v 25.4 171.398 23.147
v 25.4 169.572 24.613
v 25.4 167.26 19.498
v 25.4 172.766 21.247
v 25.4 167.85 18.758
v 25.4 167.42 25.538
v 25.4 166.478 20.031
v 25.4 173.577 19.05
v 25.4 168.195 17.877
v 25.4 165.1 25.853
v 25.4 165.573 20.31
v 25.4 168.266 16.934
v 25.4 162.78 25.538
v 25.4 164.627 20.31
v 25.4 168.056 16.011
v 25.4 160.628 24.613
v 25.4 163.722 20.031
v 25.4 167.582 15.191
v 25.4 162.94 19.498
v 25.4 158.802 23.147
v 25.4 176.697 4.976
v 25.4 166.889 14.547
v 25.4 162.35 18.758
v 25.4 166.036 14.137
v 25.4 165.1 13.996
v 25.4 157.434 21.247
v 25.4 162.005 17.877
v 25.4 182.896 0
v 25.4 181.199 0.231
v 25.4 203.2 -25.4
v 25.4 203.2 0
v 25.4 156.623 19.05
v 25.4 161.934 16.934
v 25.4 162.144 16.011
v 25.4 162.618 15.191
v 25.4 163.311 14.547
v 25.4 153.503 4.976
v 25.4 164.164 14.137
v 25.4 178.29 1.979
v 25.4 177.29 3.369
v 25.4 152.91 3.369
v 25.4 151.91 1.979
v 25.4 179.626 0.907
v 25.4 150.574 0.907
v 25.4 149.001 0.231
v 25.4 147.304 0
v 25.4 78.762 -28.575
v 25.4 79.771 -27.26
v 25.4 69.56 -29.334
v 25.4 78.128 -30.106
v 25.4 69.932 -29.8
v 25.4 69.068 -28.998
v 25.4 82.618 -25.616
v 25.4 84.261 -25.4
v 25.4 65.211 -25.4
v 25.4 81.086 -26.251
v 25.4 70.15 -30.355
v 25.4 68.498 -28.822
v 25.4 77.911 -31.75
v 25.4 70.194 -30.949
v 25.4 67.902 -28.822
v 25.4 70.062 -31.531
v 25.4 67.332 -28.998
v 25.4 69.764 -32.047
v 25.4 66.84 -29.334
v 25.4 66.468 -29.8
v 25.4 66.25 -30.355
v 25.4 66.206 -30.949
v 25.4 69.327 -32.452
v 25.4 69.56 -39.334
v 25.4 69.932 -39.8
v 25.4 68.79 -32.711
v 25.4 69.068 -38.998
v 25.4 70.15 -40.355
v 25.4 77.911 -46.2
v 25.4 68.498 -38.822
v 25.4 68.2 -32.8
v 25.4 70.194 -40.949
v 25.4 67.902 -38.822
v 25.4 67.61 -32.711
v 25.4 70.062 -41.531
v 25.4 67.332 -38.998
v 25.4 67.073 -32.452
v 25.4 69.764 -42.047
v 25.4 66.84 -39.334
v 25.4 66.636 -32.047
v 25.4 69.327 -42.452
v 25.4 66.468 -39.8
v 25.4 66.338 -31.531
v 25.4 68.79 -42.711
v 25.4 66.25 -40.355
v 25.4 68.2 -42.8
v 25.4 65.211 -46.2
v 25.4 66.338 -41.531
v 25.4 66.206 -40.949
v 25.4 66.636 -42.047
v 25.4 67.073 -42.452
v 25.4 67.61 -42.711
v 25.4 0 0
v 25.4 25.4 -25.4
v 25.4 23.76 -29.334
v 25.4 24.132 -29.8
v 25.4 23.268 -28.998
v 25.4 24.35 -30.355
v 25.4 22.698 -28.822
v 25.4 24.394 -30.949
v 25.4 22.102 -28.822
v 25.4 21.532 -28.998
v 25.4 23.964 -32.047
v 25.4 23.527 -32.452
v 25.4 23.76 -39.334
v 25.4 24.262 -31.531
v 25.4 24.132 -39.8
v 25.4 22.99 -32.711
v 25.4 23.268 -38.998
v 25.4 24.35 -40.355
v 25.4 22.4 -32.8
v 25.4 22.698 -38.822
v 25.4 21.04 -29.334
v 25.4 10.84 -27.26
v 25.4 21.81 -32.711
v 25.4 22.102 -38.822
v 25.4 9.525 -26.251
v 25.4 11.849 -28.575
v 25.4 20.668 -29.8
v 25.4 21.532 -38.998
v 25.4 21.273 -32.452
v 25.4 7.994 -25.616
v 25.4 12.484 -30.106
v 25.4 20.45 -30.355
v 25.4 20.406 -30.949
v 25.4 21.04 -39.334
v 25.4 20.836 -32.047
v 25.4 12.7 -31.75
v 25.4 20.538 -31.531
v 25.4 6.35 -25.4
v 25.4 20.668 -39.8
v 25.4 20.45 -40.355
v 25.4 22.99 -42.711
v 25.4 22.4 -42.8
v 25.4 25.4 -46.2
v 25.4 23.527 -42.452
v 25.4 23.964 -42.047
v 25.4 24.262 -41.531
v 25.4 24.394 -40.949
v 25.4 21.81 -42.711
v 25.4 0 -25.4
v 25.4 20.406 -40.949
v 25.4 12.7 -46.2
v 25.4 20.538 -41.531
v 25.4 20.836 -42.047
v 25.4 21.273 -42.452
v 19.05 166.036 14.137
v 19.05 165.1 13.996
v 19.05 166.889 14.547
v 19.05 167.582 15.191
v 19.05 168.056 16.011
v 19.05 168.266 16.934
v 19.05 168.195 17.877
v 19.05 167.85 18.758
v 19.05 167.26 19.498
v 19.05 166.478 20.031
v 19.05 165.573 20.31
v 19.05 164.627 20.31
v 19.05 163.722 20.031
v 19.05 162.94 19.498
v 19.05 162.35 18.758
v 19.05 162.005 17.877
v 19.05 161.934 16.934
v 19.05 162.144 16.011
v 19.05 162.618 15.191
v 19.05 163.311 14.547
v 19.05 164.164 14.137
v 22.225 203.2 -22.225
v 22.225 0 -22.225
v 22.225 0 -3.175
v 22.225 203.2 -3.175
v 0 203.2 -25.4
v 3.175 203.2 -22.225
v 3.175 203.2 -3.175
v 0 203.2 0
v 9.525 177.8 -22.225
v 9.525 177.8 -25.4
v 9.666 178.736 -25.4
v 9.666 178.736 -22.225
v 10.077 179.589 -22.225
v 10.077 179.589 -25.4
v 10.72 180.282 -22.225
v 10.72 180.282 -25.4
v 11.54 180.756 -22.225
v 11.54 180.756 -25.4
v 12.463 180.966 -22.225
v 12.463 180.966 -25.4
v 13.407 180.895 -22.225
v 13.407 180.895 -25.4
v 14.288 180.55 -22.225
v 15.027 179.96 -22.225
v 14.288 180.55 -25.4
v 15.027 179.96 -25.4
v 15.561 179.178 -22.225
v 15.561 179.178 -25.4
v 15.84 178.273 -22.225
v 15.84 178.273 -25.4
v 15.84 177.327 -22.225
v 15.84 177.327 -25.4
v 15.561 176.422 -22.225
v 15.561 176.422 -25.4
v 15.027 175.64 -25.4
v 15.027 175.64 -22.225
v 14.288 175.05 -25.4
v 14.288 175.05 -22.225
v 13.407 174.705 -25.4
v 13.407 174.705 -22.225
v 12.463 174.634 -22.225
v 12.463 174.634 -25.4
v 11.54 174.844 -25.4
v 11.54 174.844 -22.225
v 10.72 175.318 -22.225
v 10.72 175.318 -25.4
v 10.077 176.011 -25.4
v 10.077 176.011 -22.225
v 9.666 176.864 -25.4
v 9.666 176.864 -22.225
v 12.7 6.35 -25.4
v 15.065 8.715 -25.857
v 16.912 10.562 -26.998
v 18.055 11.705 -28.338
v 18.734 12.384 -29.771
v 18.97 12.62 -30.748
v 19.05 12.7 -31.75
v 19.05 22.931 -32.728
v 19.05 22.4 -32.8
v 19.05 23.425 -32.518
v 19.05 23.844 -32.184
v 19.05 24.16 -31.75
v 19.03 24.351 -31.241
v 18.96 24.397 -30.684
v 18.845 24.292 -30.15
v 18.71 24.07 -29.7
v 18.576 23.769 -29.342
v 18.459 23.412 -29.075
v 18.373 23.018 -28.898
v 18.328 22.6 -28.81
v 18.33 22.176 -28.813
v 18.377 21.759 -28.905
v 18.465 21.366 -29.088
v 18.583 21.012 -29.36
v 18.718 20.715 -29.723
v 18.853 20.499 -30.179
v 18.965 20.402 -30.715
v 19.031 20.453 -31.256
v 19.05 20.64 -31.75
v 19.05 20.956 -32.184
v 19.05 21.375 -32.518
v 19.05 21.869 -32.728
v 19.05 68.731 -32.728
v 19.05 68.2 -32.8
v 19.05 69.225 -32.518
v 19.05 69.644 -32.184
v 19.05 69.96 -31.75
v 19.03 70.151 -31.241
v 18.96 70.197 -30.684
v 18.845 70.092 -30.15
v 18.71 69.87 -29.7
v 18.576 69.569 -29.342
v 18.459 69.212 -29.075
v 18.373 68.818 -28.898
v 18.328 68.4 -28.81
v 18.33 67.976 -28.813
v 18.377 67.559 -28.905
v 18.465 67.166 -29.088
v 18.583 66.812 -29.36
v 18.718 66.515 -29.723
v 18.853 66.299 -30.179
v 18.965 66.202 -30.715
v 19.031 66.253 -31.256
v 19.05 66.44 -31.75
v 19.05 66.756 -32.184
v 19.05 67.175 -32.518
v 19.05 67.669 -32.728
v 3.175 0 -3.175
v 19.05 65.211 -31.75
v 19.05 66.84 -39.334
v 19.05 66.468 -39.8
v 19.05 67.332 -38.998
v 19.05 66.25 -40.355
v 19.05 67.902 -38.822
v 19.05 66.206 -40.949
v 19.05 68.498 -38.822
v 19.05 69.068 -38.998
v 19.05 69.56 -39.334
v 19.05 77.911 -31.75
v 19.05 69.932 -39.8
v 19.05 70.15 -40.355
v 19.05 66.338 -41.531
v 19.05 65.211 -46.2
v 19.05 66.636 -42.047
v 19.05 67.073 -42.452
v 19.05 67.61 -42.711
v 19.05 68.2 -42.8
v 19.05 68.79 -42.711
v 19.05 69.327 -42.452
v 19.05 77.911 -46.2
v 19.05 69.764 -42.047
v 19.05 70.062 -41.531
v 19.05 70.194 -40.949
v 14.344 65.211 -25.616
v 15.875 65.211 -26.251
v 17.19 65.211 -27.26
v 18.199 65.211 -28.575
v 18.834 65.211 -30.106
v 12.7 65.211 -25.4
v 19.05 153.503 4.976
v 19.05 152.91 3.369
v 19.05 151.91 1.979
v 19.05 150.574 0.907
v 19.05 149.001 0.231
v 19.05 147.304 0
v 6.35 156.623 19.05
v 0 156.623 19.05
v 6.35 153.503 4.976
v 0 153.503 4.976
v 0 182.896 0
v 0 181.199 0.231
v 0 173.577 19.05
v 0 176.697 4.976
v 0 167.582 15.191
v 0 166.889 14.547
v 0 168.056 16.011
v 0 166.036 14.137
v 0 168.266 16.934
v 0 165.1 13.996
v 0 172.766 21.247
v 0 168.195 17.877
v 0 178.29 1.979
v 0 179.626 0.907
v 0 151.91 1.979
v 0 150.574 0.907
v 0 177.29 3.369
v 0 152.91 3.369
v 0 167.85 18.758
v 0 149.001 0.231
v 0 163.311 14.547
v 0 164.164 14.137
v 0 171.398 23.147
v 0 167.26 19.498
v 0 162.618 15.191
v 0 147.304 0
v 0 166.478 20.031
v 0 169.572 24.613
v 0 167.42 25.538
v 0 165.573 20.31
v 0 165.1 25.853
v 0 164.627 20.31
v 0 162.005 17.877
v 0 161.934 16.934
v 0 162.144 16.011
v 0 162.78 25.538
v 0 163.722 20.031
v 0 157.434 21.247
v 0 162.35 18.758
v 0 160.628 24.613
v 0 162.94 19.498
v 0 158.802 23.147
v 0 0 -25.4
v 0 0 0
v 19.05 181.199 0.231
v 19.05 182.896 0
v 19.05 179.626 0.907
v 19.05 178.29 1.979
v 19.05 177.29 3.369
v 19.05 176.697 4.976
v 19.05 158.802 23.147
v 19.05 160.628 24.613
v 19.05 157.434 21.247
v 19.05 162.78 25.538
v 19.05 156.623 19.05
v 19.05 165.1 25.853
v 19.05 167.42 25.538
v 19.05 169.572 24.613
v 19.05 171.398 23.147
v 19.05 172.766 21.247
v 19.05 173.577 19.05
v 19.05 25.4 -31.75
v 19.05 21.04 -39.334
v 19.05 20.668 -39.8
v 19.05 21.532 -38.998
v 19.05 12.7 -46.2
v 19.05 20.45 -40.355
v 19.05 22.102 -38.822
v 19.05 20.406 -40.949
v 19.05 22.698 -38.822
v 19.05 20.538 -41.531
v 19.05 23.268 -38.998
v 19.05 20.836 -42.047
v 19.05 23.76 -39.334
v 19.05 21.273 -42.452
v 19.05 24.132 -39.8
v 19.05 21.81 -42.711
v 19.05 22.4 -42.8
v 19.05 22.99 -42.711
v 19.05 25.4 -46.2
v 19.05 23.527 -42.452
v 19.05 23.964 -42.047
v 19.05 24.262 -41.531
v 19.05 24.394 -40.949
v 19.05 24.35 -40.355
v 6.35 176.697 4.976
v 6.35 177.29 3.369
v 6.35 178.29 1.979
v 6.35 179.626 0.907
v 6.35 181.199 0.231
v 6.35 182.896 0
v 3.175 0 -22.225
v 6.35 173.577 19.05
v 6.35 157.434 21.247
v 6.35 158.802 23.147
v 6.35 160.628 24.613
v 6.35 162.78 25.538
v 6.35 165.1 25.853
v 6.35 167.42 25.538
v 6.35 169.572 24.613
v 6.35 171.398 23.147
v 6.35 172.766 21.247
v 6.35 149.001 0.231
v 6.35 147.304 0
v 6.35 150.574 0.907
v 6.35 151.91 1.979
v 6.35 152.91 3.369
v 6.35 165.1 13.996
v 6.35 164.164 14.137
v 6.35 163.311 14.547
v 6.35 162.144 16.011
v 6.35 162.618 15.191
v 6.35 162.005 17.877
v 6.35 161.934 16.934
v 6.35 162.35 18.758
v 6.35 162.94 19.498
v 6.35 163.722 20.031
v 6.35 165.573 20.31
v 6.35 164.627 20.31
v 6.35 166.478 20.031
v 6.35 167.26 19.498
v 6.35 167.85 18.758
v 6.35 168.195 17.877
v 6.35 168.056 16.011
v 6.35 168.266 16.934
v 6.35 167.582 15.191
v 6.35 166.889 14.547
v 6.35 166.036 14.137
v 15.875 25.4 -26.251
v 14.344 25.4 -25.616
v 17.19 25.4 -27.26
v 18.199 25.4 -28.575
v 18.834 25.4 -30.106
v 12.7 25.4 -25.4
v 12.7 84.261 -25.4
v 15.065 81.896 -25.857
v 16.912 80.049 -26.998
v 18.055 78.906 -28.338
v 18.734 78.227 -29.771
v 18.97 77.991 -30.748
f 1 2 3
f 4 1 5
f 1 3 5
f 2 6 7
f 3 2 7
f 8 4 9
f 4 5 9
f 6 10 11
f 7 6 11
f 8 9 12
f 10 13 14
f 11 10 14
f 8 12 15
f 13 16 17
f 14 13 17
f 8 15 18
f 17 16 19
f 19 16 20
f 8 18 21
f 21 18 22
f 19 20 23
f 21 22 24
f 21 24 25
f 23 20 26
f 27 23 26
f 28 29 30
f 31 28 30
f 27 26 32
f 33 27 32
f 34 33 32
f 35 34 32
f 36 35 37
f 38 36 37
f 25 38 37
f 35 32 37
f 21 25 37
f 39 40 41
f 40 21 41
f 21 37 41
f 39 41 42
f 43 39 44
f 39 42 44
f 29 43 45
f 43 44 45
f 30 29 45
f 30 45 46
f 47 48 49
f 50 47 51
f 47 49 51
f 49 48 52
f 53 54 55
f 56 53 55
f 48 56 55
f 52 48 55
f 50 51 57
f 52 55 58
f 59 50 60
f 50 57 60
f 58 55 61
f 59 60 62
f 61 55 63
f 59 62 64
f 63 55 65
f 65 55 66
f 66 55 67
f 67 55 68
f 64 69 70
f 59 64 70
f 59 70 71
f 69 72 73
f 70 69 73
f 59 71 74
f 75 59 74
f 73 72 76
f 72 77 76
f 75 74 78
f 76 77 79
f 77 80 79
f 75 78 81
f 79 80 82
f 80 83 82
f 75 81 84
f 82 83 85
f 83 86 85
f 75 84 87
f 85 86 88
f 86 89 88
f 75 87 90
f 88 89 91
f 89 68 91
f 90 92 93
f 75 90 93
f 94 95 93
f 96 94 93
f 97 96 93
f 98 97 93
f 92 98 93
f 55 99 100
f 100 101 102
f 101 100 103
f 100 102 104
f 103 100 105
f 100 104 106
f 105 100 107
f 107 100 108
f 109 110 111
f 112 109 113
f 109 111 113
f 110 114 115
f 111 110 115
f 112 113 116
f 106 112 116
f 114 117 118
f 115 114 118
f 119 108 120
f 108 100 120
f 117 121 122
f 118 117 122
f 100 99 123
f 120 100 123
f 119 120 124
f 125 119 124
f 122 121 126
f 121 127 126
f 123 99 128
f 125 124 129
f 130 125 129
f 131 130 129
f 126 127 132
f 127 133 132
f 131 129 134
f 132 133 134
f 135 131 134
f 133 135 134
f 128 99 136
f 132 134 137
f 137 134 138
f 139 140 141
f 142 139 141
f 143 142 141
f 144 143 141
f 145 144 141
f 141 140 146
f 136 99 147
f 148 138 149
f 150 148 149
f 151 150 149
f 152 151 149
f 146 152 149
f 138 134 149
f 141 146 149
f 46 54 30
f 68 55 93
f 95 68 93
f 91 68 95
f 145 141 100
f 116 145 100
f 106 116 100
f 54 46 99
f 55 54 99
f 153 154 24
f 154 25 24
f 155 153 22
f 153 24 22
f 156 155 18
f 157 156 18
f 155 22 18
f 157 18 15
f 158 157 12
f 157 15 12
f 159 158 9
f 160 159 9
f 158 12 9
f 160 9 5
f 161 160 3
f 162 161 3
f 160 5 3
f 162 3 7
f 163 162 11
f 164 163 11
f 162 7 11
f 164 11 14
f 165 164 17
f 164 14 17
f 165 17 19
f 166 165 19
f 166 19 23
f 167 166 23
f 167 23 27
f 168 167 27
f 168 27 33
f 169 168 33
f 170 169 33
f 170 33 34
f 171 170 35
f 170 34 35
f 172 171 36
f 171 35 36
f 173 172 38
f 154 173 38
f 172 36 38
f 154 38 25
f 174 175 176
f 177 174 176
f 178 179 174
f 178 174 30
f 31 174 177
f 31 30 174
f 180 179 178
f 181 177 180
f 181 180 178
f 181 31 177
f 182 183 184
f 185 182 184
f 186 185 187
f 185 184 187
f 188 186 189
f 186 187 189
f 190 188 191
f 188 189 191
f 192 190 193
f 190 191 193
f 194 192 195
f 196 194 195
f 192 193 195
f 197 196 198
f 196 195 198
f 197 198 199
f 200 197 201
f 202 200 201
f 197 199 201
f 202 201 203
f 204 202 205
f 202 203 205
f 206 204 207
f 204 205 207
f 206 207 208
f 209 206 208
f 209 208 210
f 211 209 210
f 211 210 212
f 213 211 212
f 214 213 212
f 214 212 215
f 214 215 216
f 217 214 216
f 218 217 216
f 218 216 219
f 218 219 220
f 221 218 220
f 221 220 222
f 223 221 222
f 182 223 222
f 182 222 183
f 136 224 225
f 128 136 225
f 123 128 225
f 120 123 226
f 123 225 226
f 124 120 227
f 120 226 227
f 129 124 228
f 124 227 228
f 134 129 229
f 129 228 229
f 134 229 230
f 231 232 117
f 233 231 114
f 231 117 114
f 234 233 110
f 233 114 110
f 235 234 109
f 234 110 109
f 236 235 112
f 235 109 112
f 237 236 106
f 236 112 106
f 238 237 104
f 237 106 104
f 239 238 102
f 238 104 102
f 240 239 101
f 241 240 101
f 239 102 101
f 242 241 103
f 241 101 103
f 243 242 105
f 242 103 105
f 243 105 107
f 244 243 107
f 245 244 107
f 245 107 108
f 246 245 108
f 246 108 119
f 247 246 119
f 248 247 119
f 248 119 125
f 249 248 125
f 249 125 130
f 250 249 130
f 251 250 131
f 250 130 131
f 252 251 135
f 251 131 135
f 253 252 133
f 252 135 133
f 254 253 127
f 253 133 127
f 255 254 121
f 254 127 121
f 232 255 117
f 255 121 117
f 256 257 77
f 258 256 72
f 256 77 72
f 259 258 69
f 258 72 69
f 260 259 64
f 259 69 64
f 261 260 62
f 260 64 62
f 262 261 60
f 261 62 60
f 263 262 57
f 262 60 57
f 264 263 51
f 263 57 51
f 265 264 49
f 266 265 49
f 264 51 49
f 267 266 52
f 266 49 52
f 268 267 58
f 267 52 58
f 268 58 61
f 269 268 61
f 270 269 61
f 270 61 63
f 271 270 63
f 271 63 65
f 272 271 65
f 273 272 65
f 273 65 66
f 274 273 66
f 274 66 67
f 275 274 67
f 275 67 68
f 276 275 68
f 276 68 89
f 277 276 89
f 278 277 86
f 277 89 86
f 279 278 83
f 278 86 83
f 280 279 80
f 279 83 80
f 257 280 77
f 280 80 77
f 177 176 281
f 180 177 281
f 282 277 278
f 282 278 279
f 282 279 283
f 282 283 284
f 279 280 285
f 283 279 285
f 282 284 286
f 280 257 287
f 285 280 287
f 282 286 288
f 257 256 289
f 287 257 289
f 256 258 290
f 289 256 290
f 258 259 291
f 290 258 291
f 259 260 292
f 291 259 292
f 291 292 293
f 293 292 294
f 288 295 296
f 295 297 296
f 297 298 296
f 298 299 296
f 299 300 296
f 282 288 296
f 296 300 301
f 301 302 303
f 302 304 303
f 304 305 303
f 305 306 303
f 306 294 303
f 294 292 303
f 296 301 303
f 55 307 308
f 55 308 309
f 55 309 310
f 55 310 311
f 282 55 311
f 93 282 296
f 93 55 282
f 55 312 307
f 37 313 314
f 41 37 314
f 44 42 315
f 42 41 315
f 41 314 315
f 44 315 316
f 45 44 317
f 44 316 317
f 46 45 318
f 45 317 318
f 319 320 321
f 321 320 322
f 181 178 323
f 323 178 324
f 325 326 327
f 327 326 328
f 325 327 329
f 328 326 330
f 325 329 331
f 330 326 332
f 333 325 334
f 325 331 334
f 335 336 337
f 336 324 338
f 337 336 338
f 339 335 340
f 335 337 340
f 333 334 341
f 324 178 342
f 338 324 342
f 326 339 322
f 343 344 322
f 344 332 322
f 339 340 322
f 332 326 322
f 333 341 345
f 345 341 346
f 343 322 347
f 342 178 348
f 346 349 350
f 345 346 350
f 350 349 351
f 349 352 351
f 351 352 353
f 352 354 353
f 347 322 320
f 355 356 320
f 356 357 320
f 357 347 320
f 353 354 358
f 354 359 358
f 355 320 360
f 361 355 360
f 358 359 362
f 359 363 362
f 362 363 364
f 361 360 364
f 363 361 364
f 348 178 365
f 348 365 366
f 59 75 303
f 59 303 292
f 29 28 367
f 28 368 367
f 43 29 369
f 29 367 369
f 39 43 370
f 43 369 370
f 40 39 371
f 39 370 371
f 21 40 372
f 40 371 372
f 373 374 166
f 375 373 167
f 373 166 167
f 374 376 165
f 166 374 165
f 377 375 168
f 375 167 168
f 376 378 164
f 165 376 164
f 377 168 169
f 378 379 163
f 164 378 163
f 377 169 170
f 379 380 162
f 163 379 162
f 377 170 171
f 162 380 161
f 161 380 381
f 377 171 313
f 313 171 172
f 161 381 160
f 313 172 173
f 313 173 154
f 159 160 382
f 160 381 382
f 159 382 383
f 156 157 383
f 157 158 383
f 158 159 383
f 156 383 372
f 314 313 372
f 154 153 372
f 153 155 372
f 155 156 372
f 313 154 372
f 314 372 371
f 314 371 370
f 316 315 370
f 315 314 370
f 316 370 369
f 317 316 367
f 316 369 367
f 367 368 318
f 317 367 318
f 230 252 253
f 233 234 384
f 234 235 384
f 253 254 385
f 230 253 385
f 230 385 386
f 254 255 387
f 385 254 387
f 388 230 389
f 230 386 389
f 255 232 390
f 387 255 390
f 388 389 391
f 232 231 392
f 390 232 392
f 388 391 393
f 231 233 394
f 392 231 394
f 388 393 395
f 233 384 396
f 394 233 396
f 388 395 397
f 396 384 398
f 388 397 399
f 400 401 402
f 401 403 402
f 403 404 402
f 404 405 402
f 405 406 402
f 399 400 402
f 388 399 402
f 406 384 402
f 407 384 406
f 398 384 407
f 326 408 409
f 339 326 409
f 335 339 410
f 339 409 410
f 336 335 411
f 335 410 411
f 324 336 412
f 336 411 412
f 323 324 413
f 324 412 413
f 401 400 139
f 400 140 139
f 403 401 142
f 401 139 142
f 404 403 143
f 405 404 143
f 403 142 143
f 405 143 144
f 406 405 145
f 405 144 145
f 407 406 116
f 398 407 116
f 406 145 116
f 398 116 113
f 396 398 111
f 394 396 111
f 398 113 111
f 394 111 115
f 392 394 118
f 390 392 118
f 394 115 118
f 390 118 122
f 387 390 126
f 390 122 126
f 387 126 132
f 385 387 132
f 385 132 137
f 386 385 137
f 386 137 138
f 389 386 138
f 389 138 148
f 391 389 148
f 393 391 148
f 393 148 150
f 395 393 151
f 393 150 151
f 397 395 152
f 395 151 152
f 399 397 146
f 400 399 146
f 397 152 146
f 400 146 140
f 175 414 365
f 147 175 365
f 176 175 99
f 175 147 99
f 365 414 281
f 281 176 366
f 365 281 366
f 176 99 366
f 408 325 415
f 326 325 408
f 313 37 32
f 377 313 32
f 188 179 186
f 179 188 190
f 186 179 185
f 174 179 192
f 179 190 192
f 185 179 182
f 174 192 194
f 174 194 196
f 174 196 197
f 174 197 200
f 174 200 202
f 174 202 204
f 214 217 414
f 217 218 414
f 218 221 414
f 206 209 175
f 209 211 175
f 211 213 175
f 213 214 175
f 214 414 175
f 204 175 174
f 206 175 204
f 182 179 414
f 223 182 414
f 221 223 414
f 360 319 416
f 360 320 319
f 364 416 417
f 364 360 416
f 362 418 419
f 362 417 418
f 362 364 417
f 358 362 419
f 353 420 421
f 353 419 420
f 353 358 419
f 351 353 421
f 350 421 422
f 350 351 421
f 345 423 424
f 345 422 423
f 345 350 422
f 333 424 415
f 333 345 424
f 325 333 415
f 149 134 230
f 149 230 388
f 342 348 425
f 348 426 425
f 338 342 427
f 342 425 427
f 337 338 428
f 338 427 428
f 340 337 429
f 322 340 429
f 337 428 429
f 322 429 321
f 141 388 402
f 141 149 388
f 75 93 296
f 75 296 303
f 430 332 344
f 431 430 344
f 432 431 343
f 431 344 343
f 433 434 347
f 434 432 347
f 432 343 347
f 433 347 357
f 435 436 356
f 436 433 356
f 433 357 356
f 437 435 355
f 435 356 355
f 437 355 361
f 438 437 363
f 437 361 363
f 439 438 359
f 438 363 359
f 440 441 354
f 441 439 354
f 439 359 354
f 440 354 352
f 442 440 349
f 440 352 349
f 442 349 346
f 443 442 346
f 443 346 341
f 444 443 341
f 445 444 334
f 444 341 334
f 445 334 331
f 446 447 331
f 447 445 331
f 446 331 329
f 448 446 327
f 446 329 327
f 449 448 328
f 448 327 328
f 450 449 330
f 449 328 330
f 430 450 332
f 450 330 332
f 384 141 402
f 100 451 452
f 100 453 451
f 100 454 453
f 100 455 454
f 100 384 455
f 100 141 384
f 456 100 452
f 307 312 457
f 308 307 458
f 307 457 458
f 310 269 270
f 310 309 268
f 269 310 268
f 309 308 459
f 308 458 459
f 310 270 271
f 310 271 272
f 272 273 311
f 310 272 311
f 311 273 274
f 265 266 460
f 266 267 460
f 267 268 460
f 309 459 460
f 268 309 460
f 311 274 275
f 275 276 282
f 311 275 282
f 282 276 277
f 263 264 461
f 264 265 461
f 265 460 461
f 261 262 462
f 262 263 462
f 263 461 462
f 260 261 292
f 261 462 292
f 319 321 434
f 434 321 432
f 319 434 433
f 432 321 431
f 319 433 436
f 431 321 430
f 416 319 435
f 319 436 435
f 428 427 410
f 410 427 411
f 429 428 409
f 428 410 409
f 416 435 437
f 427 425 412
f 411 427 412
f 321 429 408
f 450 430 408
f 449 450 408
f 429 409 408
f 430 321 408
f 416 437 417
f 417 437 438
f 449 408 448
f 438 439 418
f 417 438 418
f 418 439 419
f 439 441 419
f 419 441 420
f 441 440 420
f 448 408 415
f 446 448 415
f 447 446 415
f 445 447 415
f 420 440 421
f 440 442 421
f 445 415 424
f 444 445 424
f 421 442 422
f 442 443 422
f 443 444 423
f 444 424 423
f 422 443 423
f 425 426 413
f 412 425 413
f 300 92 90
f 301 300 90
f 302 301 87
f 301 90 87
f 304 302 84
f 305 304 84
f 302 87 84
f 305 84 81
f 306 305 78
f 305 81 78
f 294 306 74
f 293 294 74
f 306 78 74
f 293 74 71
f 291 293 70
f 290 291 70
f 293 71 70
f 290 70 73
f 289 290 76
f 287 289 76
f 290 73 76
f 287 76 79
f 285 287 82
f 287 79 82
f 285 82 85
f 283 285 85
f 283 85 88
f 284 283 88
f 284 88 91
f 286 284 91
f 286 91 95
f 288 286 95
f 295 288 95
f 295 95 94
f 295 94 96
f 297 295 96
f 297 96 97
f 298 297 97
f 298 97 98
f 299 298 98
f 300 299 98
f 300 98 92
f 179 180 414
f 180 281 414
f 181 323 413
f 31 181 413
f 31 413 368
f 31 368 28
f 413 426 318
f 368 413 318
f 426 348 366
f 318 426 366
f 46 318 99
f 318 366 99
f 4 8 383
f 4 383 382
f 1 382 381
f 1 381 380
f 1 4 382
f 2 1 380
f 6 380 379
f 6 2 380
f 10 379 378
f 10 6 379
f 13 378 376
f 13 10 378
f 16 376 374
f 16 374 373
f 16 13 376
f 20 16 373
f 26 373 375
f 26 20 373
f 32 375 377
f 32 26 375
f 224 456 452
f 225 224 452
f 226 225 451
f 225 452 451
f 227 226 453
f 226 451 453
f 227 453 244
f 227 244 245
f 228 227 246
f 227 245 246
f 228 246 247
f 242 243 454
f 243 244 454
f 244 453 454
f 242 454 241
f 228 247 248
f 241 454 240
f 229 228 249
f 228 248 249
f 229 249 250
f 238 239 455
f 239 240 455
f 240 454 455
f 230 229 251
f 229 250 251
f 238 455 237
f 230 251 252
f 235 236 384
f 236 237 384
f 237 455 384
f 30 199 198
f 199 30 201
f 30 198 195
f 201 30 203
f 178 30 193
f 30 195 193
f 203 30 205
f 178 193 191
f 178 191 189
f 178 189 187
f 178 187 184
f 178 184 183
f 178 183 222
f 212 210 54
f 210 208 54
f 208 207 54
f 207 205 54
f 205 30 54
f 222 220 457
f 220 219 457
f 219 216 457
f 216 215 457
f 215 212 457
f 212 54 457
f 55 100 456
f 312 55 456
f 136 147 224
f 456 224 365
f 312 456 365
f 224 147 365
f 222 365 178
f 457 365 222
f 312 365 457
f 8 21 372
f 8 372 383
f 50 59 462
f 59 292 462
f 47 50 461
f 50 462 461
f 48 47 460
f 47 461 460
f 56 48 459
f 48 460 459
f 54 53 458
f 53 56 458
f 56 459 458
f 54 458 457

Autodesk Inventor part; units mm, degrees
ref_plane "YZ Plane" through (0, 0, 0) normal (1, 0, 0) x (0, 1, 0)
ref_plane "XZ Plane" through (0, 0, 0) normal (0, 1, 0) x (-1, 0, 0)
sketch "Sketch2" plane through (0, 0, 0) normal (0, 1, 0) x (-1, 0, 0)
  line L0 (0, 0) -> (-25.4, 0)
  line L1 (-25.4, 0) -> (-25.4, -25.4)
  line L2 (-25.4, -25.4) -> (0, -25.4)
  line L3 (0, -25.4) -> (0, 0)
  line L4 (-3.175, -22.225) -> (-22.225, -22.225)
  line L5 (-22.225, -22.225) -> (-22.225, -3.175)
  line L6 (-22.225, -3.175) -> (-3.175, -3.175)
  line L7 (-3.175, -3.175) -> (-3.175, -22.225)
  dimension "d4" = 3.175
  dimension "d5" = 3.175
  dimension "d6" = 19.05
  dimension "d7" = 19.05
  dimension "d8" = 3.175
  dimension "d9" = 3.175
extrude "Extrusion1" add sketch "Sketch2" along normal blind 203.2
sketch "Sketch3" plane through (25.4, 0, 0) normal (1, 0, 0) x (0, 0, -1)
  line L0 (0, 0) -> (25.4, 0) projected
  line L1 (25.4, 0) -> (25.4, 203.2) projected
  line L2 (25.4, 12.7) -> (46.2, 12.7)
  line L3 (46.2, 12.7) -> (46.2, 25.4)
  line L4 (46.2, 25.4) -> (25.4, 25.4)
  line L5 (25.4, 25.4) -> (25.4, 12.7)
  line L6 (25.4, 65.2112) -> (46.2, 65.2112)
  line L7 (46.2, 65.2112) -> (46.2, 77.9112)
  line L8 (46.2, 77.9112) -> (25.4, 77.9112)
  line L9 (25.4, 77.9112) -> (25.4, 65.2112)
  dimension "d12" = 39.8112
  dimension "d13" = 20.8
  dimension "d14" = 12.7
  dimension "d15" = 12.7
extrude "Extrusion2" add sketch "Sketch3" against normal blind 6.35
fillet "Fillet1" radius 6.35 4 edges at (22.225, 77.9112, -25.4) (22.225, 12.7, -25.4) (19.05, 19.05, -25.4) (19.05, 71.5612, -25.4)
sketch "Sketch4" plane through (25.4, 0, 0) normal (1, 0, 0) x (0, 0, -1)
  circle A0 centre (30.8, 68.2) radius 2
  circle A1 centre (40.8, 68.2) radius 2
  circle A2 centre (30.8, 22.4) radius 2
  circle A3 centre (40.8, 22.4) radius 2
  line L0 (46.2, 25.4) -> (25.4, 25.4) projected
  line L1 (25.4, 65.2112) -> (46.2, 65.2112) projected
  line L2 (46.2, 77.9112) -> (31.75, 77.9112) projected
  line L3 (25.4, 84.2612) -> (25.4, 203.2) projected
  line L4 (35.8, 65.2112) -> (35.8, 77.9112)
  dimension "d19" = 4
  dimension "d23" = 3
  dimension "d25" = 45.8
  dimension "d26" = 5
  dimension "d28" = 10
extrude "Extrusion3" cut sketch "Sketch4" against normal through all
sketch "Sketch5" plane through (25.4, 0, 0) normal (1, 0, 0) x (0, 0, -1)
  line L0 (0, 33.4612) -> (0, 203.2)
  line L1 (0, 177.8) -> (-19.05, 173.5767)
  line L2 (0, 152.4) -> (-19.05, 156.6233)
  arc A0 (-19.05, 173.5767) -> (-19.05, 156.6233) centre (-17.1708, 165.1) ccw
  circle A1 centre (-17.1708, 165.1) radius 3.175
  point P0 (0, -50.8)
  dimension "d29" = 25
  dimension "PivotWidth" = 25.4
  dimension "PivotHeight" = 19.05
  dimension "PivotAngle" = 102.5
  dimension "d33" = 203.2
  dimension "PivotScrewDiameter" = 6.35
extrude "Extrusion4" add sketch "Sketch5" against normal blind 6.35
ref_plane "Work Plane1" through (12.7, 0, 0) normal (1, 0, 0) x (0, 0, -1)
mirror "Mirror1" about plane through (12.7, 0, 0) normal (1, 0, 0) of "Extrusion4"
sketch "Sketch6" plane through (25.4, 177.8, 0) normal (0, 0.9763, 0.2164) x (1, 0, 0)
  line L0 (-19.05, 0) -> (-19.05, -19.5125) projected
  line L1 (-25.4, 0) -> (-25.4, -19.5125) projected
  line L2 (-25.4, 0) -> (-25.4, -19.5125) projected
  line L3 (-25.4, -19.5125) -> (-19.05, -19.5125) projected
  line L4 (-6.35, 0) -> (-6.35, -19.5125) projected
  point P0 (0, 6.35)
  point P1 (0, 0)
  point P2 (-25.4, -38.483)
  point P3 (0, 19.05)
  point P4 (6.35, -24.7979)
  point P5 (0, -24.7979)
  dimension "PivotOpeningWidth" = 12.7
fillet "Fillet3" radius 6.35 4 edges at (22.225, 177.8, 0) (3.175, 177.8, 0) (3.175, 152.4, 0) (22.225, 152.4, 0)
sketch "Sketch7" plane through (25.4, 0, -25.4) normal (0, 0, -1) x (-1, 0, 0)
  line L0 (25.4, 203.2) -> (0, 203.2) projected
  line L1 (12.7, 6.35) -> (12.7, 25.4) projected
  circle A0 centre (12.7, 177.8) radius 3.175
  line L2 (12.7, 203.2) -> (12.7, 165.4188)
  dimension "d40" = 6.35
  dimension "d41" = 25.4
extrude "Extrusion5" cut sketch "Sketch7" against normal blind 12.7
equation "\"d4\" = MastSupportWallThickness"
equation "\"d5\" = MastSupportWallThickness"
equation "\"d6\" = MastWidth"
equation "\"d7\" = MastWidth"
equation "\"d8\" = MastSupportWallThickness"
equation "\"d9\" = MastSupportWallThickness"
equation "\"d12\" = ServoLength + ServoTolerance"
equation "\"d13\" = ServoWidth + ServoTolerance"
equation "\"d23\" = ServoScrewOffsetFromSide - 0.5 * ServoTolerance"
equation "\"d25\" = ServoScrewSpacingLength"
equation "\"d26\" = 0.5 * ServerScrewSpacing"
equation "\"d28\" = ServerScrewSpacing"
equation "\"MastSupportWallThickness\" = 3.175"
equation "\"ServoLength\" = 38.8112"
equation "\"ServoWidth\" = 19.8"
equation "\"ServerScrewSpacing\" = 10"
equation "\"ServoScrewOffsetFromSide\" = 3.5"
equation "\"ServoScrewSpacingLength\" = 45.8"
equation "\"ServoTolerance\" = 1"
equation "\"MastWidth\" = 19.05"
properties part number "TableMount-Base" material "ABS Plastic"
